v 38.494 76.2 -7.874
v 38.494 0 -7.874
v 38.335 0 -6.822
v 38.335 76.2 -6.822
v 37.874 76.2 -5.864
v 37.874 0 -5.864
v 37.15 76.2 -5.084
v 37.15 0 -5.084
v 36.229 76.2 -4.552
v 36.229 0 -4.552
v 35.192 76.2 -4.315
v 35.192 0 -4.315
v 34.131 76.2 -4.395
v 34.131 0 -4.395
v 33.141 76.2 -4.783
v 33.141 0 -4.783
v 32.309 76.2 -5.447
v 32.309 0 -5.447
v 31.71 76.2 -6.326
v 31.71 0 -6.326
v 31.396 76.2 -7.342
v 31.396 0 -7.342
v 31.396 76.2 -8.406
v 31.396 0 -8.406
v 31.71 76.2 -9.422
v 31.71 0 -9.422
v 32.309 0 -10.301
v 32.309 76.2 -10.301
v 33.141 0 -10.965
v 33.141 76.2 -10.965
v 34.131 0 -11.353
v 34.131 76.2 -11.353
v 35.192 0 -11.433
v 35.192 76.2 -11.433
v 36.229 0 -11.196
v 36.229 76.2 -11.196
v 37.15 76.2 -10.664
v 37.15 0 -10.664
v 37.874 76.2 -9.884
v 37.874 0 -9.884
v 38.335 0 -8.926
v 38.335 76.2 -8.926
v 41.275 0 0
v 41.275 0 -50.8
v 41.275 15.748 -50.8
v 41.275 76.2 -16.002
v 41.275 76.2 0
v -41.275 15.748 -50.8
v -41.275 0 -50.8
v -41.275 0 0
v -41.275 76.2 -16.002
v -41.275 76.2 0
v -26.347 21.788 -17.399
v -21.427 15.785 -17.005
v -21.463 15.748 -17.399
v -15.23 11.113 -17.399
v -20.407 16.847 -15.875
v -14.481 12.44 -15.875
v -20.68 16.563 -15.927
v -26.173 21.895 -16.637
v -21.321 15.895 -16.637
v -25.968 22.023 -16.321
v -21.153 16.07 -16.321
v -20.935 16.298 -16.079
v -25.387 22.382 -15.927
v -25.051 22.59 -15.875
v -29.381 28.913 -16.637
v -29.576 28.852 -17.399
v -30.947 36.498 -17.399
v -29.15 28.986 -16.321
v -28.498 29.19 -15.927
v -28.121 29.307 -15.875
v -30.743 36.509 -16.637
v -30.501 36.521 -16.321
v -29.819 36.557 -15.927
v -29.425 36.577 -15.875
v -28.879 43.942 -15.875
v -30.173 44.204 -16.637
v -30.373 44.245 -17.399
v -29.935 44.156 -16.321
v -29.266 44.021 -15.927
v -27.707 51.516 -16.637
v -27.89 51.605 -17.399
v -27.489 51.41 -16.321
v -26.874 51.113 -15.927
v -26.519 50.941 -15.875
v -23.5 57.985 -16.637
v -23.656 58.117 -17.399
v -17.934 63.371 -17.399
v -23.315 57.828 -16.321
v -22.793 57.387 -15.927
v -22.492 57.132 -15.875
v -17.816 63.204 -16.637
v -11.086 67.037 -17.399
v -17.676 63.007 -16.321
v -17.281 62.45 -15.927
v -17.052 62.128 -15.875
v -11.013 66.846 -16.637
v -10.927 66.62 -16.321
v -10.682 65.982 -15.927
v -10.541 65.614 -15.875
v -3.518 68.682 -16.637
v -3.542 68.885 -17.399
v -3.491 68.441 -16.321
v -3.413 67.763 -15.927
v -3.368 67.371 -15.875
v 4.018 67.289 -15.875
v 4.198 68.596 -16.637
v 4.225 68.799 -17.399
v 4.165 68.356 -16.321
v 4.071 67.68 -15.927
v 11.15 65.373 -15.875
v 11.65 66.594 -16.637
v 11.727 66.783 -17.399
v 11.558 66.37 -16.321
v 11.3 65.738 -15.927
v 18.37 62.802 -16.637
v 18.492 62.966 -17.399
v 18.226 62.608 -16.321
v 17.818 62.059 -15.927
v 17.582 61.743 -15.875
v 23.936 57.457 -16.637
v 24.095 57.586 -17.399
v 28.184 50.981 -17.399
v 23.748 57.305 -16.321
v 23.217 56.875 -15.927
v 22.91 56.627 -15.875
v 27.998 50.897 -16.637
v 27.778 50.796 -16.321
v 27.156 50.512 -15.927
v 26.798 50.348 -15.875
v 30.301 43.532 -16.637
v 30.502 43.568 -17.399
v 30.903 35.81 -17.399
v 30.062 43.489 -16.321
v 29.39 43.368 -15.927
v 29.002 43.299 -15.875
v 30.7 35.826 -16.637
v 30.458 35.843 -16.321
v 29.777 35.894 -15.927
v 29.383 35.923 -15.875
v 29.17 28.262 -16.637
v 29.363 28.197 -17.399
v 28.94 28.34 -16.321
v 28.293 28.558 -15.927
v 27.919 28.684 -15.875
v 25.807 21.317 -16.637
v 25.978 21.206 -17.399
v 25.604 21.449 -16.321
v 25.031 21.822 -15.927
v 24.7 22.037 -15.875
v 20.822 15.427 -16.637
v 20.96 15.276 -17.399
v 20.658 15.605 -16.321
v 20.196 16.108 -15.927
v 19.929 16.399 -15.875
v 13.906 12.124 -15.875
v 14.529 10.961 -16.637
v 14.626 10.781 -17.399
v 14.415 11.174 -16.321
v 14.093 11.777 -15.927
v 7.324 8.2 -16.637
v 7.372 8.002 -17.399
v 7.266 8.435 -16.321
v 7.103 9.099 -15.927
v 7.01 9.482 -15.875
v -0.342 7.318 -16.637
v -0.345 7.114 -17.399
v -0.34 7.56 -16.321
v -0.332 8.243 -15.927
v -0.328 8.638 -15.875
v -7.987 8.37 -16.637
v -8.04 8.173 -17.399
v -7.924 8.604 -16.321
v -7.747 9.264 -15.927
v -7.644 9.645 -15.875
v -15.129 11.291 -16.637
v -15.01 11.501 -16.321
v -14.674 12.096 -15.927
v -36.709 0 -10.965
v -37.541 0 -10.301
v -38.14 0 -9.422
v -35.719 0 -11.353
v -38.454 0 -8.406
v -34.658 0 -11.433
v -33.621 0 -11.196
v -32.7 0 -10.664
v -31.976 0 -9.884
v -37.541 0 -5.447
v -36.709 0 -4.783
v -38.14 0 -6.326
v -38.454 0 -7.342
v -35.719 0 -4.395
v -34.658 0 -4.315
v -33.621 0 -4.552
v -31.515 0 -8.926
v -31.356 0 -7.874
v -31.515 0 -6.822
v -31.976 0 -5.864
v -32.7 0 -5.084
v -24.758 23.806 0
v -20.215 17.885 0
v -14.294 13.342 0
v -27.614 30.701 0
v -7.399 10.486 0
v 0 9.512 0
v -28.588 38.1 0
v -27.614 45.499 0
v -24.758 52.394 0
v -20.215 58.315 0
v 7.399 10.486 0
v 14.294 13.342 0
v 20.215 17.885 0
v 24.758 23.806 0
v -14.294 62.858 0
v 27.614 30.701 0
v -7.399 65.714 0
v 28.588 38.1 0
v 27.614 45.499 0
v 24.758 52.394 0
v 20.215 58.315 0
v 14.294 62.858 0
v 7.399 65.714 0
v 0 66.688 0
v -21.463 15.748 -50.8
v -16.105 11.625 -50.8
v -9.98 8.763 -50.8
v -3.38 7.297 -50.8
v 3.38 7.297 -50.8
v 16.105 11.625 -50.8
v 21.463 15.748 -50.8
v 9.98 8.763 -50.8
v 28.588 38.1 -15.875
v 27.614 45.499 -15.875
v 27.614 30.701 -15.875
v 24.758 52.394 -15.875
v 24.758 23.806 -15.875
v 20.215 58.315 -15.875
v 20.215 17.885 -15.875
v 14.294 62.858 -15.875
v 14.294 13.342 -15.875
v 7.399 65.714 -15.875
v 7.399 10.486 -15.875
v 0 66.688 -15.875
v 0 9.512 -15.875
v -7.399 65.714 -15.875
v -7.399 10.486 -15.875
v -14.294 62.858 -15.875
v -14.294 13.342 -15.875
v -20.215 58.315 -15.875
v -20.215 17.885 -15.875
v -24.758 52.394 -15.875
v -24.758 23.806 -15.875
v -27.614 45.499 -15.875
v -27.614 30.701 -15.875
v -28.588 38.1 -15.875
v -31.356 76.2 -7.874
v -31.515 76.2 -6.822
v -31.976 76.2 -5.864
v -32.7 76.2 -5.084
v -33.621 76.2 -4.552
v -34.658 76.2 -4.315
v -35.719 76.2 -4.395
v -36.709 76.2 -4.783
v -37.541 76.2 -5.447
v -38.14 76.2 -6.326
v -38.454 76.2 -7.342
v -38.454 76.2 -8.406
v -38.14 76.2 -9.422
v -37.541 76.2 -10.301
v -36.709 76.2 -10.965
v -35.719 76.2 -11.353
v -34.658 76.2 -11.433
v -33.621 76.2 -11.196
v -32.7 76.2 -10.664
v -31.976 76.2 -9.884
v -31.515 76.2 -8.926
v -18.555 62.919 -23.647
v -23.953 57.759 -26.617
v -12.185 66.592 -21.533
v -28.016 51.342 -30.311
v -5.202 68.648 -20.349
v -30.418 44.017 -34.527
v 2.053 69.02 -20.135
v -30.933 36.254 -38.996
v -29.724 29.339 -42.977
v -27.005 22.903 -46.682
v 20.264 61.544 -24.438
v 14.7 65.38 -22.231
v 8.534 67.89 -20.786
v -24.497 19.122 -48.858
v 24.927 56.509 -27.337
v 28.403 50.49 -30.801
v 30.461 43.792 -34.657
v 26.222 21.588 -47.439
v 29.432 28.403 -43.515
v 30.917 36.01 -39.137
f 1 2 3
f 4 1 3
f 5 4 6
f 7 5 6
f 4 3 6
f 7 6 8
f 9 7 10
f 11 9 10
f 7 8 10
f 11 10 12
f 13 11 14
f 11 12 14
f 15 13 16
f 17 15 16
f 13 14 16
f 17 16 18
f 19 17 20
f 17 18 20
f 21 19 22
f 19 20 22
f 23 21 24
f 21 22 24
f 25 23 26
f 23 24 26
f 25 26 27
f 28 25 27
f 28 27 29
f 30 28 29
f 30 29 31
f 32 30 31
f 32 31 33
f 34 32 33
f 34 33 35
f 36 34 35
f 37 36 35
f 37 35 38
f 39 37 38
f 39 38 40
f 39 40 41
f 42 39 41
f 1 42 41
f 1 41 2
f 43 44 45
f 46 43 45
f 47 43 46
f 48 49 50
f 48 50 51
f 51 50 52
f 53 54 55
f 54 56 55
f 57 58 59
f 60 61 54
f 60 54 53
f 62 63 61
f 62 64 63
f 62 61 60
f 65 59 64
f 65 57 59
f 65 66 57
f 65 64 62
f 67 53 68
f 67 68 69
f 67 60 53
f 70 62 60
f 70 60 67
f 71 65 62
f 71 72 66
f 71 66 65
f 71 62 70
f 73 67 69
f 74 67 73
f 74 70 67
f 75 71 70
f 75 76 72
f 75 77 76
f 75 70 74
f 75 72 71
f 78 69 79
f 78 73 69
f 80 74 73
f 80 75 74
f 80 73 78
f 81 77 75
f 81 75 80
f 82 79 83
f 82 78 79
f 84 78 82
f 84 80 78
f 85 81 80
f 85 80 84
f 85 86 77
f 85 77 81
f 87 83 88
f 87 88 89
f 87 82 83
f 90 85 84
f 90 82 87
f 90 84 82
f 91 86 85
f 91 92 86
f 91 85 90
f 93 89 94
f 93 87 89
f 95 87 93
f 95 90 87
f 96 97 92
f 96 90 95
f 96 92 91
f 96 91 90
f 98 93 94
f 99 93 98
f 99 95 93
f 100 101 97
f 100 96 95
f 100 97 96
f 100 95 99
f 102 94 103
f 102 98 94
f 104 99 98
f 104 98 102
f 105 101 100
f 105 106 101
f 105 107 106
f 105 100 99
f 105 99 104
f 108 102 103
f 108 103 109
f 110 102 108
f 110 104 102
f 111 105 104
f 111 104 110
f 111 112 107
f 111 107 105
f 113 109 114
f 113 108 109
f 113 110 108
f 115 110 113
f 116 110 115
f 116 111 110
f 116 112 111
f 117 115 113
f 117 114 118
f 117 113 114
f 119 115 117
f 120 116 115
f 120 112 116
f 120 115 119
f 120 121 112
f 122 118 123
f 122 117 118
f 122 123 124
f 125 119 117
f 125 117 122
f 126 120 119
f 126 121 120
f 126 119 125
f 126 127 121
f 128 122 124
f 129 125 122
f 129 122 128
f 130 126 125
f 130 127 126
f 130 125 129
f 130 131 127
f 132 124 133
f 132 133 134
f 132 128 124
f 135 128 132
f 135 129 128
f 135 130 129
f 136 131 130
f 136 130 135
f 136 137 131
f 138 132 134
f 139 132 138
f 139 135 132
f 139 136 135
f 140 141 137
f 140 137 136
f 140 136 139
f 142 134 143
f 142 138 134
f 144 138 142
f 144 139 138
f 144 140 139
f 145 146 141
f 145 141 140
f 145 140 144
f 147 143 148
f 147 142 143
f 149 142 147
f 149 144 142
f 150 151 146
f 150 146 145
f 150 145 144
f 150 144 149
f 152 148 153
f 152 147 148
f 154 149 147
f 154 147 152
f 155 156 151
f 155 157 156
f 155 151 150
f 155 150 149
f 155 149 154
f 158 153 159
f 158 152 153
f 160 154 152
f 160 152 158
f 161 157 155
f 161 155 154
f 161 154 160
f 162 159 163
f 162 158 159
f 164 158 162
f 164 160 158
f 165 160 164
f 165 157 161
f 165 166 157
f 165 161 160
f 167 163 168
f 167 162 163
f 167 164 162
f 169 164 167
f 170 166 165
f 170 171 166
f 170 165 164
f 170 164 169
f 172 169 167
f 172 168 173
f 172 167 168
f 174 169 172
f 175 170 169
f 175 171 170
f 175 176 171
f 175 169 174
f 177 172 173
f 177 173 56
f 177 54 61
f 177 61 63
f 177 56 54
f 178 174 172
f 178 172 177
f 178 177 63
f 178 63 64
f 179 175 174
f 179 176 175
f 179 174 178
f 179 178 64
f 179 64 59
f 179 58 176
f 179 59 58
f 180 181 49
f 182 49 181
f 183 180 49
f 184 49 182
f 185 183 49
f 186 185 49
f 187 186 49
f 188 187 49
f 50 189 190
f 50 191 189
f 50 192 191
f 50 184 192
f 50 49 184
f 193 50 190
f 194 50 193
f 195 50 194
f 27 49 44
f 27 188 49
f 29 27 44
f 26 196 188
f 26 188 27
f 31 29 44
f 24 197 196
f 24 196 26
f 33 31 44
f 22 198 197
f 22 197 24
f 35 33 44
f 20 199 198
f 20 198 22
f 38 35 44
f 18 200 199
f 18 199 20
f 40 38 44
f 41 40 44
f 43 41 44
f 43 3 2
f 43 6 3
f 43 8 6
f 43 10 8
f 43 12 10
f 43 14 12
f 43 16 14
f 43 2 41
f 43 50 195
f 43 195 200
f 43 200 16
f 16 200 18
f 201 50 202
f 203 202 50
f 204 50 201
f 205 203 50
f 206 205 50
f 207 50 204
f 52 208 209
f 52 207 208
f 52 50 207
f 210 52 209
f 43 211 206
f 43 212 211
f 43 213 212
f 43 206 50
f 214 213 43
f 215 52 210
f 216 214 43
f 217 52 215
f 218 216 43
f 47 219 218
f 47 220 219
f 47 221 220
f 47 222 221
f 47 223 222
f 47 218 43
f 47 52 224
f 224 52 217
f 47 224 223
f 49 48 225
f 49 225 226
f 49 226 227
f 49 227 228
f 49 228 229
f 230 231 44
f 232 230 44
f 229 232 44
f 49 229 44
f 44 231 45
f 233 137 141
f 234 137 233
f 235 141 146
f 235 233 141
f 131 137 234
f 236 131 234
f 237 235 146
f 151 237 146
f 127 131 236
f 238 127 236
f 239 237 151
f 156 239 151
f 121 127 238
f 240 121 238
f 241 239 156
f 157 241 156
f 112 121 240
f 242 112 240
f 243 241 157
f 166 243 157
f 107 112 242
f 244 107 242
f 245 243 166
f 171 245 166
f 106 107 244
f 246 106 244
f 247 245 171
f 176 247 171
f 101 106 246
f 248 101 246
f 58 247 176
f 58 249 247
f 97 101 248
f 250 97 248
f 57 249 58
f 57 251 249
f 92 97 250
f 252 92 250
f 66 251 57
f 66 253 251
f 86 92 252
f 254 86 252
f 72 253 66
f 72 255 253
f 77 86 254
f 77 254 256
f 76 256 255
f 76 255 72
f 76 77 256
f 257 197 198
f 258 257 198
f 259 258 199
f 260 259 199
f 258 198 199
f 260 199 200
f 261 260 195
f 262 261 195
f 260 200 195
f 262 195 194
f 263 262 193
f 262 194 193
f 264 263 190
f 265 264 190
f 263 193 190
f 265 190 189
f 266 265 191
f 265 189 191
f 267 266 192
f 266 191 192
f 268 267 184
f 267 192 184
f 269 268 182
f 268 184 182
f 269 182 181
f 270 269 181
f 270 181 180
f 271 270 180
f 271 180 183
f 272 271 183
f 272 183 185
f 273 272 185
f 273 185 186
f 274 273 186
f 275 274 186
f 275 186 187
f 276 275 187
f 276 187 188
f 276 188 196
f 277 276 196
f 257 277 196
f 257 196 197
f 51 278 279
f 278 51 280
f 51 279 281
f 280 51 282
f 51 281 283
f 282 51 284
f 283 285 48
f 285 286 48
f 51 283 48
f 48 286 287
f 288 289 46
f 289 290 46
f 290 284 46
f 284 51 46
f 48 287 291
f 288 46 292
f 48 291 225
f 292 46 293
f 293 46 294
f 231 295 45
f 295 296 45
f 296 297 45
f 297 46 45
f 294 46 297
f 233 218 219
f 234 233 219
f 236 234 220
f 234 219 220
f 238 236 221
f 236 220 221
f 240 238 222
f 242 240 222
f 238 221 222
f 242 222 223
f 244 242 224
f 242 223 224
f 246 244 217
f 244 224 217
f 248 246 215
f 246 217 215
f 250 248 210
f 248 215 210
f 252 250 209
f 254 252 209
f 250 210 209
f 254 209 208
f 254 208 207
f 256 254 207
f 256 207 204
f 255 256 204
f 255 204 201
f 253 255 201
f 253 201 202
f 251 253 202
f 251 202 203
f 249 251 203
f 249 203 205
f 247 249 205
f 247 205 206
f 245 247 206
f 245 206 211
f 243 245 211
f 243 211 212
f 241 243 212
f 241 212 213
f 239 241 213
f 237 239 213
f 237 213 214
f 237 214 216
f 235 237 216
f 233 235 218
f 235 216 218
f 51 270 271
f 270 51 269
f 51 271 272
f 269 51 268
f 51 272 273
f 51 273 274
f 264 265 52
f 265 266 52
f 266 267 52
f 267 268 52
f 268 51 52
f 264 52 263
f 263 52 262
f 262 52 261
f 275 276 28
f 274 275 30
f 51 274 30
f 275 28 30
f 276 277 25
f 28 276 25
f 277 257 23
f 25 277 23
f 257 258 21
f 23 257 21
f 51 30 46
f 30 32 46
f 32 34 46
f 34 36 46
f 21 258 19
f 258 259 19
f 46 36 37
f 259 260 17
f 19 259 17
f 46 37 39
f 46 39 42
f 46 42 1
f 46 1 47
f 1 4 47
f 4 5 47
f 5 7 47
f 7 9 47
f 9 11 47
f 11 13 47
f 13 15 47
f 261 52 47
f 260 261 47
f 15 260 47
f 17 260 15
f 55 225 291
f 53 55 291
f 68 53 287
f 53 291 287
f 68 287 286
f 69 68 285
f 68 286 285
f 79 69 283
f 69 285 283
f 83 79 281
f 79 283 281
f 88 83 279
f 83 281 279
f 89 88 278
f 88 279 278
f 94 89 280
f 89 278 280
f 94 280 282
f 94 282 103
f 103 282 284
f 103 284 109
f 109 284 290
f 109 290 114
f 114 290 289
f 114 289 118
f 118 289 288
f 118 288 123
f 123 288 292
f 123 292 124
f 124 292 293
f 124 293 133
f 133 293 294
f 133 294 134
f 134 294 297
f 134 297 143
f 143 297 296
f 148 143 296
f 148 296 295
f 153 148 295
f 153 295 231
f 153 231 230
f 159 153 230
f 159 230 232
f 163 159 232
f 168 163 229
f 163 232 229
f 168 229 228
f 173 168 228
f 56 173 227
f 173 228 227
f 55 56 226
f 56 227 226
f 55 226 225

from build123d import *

# Parameters (mm, degrees)
SKETCH1_W          = 82.55
SKETCH1_H          = 76.2
SKETCH1_R          = 28.5877
EXTRUDE1_DEPTH     = 50.8
CUT_EXTRUDE1_DEPTH = 83.55
SKETCH3_R          = 30.988
CUT_EXTRUDE2_DEPTH = 34.925
FILLET1_R          = 1.524
HOLE1_D            = 7.1374
HOLE1_DEPTH        = 76.2


with BuildPart() as part:
    # Sketch1 → Extrude1 (new body)
    with BuildSketch(Plane.XY):
        with Locations((0, 38.1)):
            Rectangle(SKETCH1_W, SKETCH1_H)
        with Locations((0, 38.1)):
            Circle(SKETCH1_R, mode=Mode.SUBTRACT)
    extrude(amount=-EXTRUDE1_DEPTH)

    # Sketch2 → Cut-Extrude1 (cut, through all)
    with BuildSketch(Plane(origin=(41.275, 0, 0), x_dir=(0, 0, -1), z_dir=(1, 0, 0))):
        Polygon((16.002, 76.2), (50.8, 15.748), (50.8, 76.2), align=None)
    extrude(amount=-CUT_EXTRUDE1_DEPTH, mode=Mode.SUBTRACT)

    # Sketch3 → Cut-Extrude2 (cut)
    with BuildSketch(Plane(origin=(0, 0, -50.8), x_dir=(-1, 0, 0), z_dir=(0, 0, -1))):
        with Locations(Location((0, 38.1, 0), (0, 0, 313.83713531))):  # turned: the seam where the file's is
            Circle(SKETCH3_R)
    extrude(amount=-CUT_EXTRUDE2_DEPTH, mode=Mode.SUBTRACT)

    # Fillet1
    fillet1_edges = [part.edges().sort_by_distance(p)[0] for p in [
        (21.462624257, 60.452, -15.875),
    ]]
    fillet(fillet1_edges, radius=FILLET1_R)

    # Hole1
    with Locations(Plane(origin=(0, 76.2, 0), x_dir=(-1, 0, 0), z_dir=(0, 1, 0))):
        with Locations((34.925, -7.874), (-34.925, -7.874)):
            Hole(HOLE1_D / 2, depth=HOLE1_DEPTH)


solid = part.part
